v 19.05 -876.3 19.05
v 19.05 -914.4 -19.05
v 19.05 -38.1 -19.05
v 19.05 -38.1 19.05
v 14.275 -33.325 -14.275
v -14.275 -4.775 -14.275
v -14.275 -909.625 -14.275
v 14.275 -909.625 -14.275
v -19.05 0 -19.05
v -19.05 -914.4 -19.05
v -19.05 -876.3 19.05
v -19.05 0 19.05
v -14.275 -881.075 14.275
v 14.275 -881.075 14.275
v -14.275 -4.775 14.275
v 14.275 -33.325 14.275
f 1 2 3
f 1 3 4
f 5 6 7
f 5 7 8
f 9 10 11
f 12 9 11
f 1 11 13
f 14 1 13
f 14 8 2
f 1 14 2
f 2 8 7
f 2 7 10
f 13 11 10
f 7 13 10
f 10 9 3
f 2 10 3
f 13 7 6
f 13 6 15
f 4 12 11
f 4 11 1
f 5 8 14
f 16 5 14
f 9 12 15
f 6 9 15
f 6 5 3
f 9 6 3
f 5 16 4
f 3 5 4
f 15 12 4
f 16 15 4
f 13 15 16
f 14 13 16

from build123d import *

# Parameters (mm, degrees)
F0_W     = 38.1
F0_H     = 38.1
F0_W_2   = 28.5496
F0_H_2   = 28.5496
F1_DEPTH = 914.4
F4_DEPTH = 38.101
F5_DEPTH = 38.101


with BuildPart() as f1:
    # F0 (on Front) → F1 (new body)
    with BuildSketch(Plane.XZ):
        Rectangle(F0_W, F0_H)
        Rectangle(F0_W_2, F0_H_2, mode=Mode.SUBTRACT)
    extrude(amount=F1_DEPTH)

    # F2 (on face) → F4 (cut, through all)
    with BuildSketch(Plane.XY.offset(19.05)):
        Polygon((19.05, 0), (-19.05, 0), (19.05, -38.1), align=None)
    extrude(amount=-F4_DEPTH, mode=Mode.SUBTRACT)

    # F3 (on face) → F5 (cut, through all)
    with BuildSketch(Plane(origin=(-19.05, 0, 0), x_dir=(0, -1, 0), z_dir=(-1, 0, 0))):
        Polygon((876.3, 19.05), (914.4, -19.05), (914.4, 19.05), align=None)
    extrude(amount=-F5_DEPTH, mode=Mode.SUBTRACT)


solid = f1.part
